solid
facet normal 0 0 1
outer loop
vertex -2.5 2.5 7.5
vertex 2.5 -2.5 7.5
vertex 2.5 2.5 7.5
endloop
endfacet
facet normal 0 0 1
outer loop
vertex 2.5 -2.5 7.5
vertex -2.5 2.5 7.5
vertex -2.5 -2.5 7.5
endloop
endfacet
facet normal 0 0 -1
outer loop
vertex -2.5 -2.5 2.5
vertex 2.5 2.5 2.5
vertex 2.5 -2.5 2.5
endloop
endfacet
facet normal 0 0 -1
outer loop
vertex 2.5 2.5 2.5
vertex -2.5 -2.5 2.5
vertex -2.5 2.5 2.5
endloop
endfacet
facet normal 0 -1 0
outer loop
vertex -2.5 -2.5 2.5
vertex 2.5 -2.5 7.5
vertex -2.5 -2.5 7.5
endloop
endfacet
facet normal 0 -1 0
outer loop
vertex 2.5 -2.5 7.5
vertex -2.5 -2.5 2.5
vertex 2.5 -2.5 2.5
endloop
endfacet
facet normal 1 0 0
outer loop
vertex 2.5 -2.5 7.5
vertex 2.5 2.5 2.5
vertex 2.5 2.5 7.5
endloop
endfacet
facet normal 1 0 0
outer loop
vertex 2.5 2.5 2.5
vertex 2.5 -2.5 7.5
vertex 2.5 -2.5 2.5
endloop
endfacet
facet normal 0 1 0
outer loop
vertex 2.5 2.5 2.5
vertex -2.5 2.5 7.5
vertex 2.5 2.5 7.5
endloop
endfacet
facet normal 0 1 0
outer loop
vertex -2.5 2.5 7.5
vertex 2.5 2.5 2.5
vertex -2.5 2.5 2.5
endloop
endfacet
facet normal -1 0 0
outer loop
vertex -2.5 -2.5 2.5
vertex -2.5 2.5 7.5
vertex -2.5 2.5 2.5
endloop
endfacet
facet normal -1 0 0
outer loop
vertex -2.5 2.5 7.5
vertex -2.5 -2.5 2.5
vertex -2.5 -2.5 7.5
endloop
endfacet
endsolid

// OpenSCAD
// 2D child
projection(cut=true) { square(); }

projection(cut=true) translate([20,0,0]) cube(10, center=true);

// Boundary case: clipping the top of a cube
translate([0,20,0]) projection(cut=true) translate([0,0,-4.999999]) cube(10, center=true);

// Empty cut
projection(cut=true) !translate([0,0,5]) cube(5, center=true);

// holes
translate([0,-10,0]) projection(cut=true) {
  union() {
      difference() { cube(5,center=true); cube(4,center=true); }
      translate([2.1,2.1]) difference() { cube(5,center=true); cube(4,center=true); }
  }
}

// Verify hole winding order
translate([-15,0,0])
minkowski() {
	projection(cut=true) difference() {
		cube(10,center=true);
		cube([5,5,20],center=true);
	}
	square(1);
}
